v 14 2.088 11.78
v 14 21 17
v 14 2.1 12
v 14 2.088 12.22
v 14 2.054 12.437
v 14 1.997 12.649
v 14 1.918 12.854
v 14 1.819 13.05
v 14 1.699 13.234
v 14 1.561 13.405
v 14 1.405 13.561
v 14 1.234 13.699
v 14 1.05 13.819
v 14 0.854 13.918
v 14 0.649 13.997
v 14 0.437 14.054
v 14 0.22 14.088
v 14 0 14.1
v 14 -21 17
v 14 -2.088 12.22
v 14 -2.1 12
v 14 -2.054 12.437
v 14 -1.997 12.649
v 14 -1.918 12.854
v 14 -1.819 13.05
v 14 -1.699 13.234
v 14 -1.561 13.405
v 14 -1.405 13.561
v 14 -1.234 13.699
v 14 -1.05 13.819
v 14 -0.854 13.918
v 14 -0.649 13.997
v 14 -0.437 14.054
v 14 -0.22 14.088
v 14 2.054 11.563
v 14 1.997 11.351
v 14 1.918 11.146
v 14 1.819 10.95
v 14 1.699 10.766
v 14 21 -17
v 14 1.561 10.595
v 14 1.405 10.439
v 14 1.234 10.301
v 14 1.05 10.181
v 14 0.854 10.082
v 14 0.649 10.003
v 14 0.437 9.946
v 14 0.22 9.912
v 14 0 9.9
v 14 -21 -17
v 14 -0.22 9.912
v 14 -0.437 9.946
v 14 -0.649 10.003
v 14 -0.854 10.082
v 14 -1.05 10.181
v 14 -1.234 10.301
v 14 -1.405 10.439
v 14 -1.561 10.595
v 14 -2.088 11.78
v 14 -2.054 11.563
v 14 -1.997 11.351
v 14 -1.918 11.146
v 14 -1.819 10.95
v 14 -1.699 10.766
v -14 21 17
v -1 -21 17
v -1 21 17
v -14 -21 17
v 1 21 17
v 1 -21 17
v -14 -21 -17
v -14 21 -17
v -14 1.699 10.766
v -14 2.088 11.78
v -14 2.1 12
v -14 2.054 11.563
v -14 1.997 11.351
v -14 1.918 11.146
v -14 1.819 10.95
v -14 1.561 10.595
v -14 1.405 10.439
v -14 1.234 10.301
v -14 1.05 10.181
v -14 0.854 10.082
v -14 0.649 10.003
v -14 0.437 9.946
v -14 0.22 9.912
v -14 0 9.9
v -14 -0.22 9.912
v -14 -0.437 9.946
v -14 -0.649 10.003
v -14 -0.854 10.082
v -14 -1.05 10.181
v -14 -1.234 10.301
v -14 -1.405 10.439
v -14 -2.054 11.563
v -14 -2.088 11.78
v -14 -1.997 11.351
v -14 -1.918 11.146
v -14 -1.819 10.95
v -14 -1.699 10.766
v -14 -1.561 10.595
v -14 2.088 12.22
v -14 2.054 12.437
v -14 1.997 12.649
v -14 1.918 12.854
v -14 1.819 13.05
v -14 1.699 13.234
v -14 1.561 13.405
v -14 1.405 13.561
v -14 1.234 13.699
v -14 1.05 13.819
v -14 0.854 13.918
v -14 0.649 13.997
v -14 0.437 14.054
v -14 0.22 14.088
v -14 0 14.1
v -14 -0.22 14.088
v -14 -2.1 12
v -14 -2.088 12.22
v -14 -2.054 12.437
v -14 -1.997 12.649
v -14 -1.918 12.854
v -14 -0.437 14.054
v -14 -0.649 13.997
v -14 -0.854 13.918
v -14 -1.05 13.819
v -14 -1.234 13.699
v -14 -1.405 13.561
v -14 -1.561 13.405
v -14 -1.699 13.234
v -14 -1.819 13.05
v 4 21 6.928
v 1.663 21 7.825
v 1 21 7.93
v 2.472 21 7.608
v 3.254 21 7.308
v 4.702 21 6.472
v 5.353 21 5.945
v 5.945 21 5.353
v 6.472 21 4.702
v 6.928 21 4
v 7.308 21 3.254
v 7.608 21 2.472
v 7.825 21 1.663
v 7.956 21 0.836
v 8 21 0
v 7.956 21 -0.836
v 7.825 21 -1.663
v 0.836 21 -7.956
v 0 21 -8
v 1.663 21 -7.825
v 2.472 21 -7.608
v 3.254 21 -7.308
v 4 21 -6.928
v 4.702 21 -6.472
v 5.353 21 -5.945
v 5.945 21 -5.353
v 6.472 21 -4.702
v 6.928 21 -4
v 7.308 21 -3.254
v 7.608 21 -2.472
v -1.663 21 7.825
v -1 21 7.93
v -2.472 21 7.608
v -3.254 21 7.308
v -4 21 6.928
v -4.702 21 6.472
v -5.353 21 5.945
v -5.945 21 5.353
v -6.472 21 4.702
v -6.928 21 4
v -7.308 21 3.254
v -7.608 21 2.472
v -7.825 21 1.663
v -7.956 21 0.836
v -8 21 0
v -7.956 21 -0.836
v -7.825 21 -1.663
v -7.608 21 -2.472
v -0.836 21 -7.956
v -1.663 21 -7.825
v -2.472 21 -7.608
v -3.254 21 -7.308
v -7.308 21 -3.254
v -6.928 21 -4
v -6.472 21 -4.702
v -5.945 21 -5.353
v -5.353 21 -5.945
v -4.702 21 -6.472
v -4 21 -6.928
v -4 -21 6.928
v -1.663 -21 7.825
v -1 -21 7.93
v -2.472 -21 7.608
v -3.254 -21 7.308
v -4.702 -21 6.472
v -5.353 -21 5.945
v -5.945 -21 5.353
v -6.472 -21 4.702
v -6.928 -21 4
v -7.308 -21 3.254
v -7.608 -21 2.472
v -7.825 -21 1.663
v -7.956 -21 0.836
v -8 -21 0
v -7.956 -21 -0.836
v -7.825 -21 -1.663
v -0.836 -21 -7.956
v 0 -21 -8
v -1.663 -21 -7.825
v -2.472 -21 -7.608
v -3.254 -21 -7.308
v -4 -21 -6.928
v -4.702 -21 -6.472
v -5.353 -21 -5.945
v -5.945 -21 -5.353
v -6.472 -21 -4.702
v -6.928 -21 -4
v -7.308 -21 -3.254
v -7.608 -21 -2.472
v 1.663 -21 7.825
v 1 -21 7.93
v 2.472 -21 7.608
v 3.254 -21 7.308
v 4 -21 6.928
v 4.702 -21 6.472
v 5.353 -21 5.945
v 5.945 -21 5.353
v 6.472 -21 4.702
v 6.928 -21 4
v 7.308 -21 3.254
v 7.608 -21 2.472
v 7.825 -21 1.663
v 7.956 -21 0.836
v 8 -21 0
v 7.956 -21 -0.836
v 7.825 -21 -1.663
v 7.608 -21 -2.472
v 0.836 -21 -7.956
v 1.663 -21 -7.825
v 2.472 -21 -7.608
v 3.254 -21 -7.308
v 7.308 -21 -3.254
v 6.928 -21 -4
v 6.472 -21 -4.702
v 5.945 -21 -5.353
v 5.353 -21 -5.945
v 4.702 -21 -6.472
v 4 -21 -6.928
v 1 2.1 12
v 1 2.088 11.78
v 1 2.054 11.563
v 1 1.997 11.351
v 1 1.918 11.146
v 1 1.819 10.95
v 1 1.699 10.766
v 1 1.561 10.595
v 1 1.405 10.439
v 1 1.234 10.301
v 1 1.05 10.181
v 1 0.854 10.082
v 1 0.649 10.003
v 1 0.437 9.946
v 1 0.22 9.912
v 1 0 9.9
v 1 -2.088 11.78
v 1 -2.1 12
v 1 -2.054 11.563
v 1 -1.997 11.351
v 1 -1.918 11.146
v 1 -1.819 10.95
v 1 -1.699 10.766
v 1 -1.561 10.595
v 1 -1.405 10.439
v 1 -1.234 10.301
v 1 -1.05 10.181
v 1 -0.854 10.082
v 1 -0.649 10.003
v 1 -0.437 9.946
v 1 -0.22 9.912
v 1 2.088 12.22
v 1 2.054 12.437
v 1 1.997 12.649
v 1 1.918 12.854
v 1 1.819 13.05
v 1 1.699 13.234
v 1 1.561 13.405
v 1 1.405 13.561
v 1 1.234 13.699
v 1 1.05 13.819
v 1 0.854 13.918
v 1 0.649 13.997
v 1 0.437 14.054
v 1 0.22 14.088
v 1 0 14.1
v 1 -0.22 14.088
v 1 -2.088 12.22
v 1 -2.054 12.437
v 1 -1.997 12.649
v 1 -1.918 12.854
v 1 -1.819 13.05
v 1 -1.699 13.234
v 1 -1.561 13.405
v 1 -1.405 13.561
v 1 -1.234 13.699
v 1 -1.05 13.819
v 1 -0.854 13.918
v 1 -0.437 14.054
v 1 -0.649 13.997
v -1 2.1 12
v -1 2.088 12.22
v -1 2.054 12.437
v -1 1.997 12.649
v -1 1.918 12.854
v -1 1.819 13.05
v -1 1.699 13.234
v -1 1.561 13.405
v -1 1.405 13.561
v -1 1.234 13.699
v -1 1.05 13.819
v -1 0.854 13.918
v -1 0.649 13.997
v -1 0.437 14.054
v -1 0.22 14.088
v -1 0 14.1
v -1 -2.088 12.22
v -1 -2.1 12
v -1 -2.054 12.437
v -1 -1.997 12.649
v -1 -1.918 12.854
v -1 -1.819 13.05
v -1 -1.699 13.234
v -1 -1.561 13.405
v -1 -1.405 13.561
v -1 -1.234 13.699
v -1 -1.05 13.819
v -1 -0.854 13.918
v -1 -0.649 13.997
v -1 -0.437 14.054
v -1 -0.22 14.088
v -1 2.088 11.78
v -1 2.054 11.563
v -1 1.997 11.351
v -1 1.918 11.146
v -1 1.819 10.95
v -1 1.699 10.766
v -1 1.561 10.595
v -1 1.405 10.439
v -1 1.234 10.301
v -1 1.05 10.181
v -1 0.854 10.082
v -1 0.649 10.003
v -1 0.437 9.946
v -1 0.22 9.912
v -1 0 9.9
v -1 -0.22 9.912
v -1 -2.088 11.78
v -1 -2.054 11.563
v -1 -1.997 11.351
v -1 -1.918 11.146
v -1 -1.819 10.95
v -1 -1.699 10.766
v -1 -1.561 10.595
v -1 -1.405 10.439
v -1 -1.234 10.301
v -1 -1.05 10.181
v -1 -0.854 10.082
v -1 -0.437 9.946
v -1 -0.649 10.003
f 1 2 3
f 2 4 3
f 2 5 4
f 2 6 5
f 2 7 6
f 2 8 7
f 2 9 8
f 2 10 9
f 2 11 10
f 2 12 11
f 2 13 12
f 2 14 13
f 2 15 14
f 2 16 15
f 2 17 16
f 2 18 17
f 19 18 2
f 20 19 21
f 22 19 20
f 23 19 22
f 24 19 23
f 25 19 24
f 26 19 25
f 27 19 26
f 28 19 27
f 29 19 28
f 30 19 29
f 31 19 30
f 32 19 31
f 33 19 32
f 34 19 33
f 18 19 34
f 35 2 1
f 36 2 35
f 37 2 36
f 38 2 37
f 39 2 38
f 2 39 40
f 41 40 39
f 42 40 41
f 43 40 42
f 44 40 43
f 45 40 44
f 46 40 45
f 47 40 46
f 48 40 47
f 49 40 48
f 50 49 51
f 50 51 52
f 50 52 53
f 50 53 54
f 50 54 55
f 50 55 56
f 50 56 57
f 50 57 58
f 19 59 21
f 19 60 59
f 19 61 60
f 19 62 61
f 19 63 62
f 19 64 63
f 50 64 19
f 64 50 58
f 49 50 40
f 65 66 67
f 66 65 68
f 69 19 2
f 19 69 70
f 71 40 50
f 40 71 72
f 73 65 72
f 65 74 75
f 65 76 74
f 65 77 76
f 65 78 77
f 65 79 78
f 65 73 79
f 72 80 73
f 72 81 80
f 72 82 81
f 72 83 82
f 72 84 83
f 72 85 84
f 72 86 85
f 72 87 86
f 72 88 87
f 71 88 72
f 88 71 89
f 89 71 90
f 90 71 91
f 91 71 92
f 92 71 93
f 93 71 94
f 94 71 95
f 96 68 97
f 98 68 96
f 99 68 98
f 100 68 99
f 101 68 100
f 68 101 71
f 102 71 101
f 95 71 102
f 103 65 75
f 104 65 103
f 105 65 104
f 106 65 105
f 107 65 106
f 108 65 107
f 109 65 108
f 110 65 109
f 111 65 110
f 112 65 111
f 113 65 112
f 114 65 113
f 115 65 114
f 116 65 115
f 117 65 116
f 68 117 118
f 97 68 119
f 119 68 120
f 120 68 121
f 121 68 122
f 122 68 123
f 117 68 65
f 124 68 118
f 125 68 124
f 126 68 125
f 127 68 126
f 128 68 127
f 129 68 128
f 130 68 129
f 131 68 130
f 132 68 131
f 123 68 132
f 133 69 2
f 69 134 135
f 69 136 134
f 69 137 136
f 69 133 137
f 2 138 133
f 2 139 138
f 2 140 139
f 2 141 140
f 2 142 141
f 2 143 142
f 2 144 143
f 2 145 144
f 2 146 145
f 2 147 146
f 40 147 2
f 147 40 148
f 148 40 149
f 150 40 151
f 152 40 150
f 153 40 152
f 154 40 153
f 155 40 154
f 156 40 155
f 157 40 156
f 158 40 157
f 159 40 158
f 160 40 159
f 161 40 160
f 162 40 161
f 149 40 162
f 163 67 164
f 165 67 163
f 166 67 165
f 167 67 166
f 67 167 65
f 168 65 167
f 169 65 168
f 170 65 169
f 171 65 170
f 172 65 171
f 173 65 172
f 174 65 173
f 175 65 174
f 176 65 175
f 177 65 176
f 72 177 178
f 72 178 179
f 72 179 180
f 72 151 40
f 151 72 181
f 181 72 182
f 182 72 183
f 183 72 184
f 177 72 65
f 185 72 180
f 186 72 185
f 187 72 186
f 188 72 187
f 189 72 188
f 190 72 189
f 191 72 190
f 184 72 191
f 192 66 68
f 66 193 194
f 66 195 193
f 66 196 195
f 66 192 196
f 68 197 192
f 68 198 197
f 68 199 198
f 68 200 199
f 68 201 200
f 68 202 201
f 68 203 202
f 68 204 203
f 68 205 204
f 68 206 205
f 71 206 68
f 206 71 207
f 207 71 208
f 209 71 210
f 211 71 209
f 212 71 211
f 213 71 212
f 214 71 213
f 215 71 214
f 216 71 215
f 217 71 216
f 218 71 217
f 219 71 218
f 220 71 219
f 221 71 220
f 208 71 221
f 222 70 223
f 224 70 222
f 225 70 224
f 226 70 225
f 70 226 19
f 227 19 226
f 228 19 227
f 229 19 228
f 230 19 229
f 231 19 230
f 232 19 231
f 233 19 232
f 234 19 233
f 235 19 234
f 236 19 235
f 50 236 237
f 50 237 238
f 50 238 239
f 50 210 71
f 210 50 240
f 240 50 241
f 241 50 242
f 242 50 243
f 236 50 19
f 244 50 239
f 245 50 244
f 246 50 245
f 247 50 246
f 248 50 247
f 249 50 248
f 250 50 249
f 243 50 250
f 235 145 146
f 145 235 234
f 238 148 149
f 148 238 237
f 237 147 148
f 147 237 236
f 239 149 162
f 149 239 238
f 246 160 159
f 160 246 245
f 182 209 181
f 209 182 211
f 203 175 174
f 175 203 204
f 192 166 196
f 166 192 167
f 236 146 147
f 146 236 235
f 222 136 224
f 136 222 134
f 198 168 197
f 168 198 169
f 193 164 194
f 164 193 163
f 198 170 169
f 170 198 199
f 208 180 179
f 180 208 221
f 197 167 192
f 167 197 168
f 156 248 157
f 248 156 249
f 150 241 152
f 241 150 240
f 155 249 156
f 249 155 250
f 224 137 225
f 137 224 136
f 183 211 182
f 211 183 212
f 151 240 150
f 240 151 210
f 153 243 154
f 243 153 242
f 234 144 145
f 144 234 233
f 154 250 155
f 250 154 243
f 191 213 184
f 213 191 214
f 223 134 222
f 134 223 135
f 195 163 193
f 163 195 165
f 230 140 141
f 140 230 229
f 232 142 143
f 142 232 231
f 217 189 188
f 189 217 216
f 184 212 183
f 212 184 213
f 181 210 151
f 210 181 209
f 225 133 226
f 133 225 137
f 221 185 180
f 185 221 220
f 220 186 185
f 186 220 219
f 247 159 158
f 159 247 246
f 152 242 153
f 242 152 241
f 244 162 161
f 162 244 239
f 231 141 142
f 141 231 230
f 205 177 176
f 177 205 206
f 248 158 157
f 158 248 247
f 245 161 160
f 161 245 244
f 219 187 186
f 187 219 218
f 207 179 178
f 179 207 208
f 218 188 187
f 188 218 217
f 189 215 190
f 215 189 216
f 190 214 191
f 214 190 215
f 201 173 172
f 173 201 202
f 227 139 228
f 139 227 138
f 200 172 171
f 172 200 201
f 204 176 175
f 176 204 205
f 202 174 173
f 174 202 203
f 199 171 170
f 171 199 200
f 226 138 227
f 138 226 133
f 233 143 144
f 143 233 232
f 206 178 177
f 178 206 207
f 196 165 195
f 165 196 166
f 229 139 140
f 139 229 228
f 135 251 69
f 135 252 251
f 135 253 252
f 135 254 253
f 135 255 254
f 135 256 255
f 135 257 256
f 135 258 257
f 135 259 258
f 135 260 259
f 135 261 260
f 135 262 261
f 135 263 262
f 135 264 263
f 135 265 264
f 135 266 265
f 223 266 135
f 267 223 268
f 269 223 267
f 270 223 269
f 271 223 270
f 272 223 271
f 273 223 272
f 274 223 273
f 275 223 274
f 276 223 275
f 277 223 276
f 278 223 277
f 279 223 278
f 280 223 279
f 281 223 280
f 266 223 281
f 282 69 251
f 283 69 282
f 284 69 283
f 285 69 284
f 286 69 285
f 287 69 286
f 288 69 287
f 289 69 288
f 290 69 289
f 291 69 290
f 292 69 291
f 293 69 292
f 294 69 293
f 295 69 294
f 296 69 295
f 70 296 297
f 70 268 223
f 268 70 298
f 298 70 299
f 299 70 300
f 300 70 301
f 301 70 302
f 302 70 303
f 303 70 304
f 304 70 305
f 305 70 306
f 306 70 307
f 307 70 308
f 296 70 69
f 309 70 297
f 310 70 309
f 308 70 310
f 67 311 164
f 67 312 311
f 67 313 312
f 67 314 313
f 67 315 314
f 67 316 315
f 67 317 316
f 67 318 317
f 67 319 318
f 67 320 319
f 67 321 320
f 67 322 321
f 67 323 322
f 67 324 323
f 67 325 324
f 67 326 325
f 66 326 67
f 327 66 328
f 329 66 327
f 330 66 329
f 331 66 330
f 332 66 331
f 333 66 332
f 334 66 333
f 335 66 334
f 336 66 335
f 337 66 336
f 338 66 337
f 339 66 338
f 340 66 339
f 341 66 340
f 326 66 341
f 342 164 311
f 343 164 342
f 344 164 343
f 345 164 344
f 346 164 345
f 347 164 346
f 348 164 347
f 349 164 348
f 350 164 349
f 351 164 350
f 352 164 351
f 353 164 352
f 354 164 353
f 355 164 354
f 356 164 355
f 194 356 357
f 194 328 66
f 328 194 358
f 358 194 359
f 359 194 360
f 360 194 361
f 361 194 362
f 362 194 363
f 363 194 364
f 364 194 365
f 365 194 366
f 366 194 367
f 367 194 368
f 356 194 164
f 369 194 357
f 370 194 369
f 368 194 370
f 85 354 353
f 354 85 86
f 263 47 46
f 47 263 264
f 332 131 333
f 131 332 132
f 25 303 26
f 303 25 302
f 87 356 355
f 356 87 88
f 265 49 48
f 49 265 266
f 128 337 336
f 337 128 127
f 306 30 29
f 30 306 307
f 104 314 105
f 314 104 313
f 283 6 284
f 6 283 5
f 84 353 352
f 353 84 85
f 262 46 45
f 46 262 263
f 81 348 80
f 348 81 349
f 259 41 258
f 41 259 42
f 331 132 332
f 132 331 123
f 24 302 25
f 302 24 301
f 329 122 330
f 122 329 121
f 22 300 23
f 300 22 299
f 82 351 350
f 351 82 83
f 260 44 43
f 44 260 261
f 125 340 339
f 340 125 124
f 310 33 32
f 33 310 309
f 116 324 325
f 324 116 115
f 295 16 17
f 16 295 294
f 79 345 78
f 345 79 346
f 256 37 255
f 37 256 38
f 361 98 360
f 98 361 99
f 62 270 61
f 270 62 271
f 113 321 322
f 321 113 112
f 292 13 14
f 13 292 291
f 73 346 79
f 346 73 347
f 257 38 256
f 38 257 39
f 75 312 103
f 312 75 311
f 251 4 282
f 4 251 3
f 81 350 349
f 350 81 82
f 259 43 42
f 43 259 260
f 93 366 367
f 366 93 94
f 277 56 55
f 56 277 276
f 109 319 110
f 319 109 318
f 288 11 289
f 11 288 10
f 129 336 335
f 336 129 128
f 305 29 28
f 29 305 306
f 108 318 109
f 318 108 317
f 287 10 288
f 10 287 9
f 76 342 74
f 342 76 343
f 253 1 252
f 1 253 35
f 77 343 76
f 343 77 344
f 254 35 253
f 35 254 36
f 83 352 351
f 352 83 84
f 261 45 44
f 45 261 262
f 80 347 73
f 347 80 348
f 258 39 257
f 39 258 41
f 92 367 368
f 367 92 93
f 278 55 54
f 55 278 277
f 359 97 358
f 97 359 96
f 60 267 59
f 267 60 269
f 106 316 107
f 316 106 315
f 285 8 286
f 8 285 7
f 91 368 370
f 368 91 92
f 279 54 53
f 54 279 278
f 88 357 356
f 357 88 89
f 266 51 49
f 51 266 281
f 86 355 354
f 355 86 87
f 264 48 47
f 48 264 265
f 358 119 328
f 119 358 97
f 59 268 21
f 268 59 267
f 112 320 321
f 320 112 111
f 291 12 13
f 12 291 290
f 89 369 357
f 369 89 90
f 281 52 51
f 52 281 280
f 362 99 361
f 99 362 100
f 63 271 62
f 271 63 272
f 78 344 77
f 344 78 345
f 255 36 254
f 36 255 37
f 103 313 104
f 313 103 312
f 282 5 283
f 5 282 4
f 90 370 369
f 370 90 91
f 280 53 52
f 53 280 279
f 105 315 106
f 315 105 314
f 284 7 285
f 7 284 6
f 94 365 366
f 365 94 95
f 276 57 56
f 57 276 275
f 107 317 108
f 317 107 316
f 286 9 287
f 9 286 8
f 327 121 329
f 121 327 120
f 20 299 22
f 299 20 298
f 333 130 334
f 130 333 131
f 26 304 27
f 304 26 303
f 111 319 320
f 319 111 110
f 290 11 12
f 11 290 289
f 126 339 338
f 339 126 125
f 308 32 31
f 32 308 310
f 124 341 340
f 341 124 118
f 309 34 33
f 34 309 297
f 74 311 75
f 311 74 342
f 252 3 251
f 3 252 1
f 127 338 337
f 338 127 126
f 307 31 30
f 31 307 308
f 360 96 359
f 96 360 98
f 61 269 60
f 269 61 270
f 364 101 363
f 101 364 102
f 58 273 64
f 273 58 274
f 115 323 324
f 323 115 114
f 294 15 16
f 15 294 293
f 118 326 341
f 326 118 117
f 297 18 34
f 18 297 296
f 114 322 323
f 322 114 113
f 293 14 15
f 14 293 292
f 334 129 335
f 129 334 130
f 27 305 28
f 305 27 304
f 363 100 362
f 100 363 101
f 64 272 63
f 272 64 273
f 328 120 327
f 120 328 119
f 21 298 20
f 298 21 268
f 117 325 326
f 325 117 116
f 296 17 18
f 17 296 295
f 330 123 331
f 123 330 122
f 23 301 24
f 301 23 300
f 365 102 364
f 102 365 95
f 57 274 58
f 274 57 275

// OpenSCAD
// Split clamp block.
$fn = 60;
eps = 0.02;
bore_d = 16;
body_w = 42;
body_h = 34;
body_l = 28;
slot_w = 2;
difference() {
    cube([body_l, body_w, body_h], center = true);
    translate([0, -body_w / 2 - eps, 0]) rotate([-90,0,0]) cylinder(d = bore_d, h = body_w + 2 * eps);
    translate([-slot_w / 2, -body_w / 2 - eps, 0]) cube([slot_w, body_w + 2 * eps, body_h / 2 + eps]);
    translate([-body_l / 2 - eps, 0, body_h / 2 - 5]) rotate([0,90,0]) cylinder(d = 4.2, h = body_l + 2 * eps);
}
